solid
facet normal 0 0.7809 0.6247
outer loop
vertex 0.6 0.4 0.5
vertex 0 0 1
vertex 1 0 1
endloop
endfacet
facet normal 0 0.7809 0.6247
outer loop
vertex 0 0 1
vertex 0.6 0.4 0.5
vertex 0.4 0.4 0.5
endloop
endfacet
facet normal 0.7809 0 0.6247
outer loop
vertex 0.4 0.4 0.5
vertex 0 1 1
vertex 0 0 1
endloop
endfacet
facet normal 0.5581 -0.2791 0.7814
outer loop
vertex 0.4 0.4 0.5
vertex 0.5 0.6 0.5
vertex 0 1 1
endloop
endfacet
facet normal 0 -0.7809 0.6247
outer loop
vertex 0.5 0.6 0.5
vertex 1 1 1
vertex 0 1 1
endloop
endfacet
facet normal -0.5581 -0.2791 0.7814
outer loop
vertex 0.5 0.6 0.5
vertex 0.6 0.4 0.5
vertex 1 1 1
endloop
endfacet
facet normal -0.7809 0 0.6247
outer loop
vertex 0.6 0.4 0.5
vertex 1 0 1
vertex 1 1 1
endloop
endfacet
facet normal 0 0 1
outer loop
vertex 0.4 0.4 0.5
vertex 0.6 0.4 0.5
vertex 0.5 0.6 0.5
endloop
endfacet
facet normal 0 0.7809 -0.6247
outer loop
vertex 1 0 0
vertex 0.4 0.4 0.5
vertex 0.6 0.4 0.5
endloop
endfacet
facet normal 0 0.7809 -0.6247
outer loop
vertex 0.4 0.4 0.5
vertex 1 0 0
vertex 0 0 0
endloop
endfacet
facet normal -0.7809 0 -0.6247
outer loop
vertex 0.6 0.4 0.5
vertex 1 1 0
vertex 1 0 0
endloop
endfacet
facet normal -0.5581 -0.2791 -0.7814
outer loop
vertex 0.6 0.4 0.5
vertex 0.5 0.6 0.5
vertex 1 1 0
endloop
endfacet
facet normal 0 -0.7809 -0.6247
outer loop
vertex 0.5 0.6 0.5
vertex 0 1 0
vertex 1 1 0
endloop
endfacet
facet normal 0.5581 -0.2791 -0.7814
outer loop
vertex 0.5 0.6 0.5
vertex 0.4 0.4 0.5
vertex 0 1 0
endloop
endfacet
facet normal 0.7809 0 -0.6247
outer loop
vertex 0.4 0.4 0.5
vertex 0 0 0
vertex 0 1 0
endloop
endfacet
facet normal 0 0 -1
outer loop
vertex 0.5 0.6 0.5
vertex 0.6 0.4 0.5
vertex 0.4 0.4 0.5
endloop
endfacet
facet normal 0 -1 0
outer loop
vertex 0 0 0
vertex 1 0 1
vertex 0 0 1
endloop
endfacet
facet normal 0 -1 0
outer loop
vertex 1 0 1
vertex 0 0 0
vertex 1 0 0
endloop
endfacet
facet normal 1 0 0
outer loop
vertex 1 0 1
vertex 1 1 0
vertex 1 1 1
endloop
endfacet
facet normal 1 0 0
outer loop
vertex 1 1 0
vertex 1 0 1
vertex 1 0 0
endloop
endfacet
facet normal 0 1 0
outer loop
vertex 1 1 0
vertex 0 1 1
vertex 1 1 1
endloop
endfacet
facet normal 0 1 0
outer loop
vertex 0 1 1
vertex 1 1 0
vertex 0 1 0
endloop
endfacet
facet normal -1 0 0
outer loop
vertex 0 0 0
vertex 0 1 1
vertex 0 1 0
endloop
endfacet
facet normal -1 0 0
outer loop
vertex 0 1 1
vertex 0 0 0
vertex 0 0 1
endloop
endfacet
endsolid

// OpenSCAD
polyhedron(
  points=[
    [0, 0, 0],
    [1, 0, 0],
    [0, 1, 0],
    [1, 1, 0],

    [0, 0, 1],
    [1, 0, 1],
    [0, 1, 1],
    [1, 1, 1],

    [0.4, 0.4, 0.5],
    [0.6, 0.4, 0.5],
    [0.5, 0.6, 0.5],

    [0.4, 0.4, 0.5],
    [0.6, 0.4, 0.5],
    [0.5, 0.6, 0.5],
  ],
  faces=[
    [5,4,11,12],
    [4,6,11],
    [6,13,11],
    [6,7,13],
    [7,12,13],
    [7,5,12],
    [13,12,11],
    
    [0,1,9,8],
    [1,3,9],
    [3,10,9],
    [3,2,10],
    [2,8,10],
    [2,0,8],
    [8,9,10],
    
    [4,5,1,0],
    [5,7,3,1],
    [7,6,2,3],
    [6,4,0,2],
  ]);
